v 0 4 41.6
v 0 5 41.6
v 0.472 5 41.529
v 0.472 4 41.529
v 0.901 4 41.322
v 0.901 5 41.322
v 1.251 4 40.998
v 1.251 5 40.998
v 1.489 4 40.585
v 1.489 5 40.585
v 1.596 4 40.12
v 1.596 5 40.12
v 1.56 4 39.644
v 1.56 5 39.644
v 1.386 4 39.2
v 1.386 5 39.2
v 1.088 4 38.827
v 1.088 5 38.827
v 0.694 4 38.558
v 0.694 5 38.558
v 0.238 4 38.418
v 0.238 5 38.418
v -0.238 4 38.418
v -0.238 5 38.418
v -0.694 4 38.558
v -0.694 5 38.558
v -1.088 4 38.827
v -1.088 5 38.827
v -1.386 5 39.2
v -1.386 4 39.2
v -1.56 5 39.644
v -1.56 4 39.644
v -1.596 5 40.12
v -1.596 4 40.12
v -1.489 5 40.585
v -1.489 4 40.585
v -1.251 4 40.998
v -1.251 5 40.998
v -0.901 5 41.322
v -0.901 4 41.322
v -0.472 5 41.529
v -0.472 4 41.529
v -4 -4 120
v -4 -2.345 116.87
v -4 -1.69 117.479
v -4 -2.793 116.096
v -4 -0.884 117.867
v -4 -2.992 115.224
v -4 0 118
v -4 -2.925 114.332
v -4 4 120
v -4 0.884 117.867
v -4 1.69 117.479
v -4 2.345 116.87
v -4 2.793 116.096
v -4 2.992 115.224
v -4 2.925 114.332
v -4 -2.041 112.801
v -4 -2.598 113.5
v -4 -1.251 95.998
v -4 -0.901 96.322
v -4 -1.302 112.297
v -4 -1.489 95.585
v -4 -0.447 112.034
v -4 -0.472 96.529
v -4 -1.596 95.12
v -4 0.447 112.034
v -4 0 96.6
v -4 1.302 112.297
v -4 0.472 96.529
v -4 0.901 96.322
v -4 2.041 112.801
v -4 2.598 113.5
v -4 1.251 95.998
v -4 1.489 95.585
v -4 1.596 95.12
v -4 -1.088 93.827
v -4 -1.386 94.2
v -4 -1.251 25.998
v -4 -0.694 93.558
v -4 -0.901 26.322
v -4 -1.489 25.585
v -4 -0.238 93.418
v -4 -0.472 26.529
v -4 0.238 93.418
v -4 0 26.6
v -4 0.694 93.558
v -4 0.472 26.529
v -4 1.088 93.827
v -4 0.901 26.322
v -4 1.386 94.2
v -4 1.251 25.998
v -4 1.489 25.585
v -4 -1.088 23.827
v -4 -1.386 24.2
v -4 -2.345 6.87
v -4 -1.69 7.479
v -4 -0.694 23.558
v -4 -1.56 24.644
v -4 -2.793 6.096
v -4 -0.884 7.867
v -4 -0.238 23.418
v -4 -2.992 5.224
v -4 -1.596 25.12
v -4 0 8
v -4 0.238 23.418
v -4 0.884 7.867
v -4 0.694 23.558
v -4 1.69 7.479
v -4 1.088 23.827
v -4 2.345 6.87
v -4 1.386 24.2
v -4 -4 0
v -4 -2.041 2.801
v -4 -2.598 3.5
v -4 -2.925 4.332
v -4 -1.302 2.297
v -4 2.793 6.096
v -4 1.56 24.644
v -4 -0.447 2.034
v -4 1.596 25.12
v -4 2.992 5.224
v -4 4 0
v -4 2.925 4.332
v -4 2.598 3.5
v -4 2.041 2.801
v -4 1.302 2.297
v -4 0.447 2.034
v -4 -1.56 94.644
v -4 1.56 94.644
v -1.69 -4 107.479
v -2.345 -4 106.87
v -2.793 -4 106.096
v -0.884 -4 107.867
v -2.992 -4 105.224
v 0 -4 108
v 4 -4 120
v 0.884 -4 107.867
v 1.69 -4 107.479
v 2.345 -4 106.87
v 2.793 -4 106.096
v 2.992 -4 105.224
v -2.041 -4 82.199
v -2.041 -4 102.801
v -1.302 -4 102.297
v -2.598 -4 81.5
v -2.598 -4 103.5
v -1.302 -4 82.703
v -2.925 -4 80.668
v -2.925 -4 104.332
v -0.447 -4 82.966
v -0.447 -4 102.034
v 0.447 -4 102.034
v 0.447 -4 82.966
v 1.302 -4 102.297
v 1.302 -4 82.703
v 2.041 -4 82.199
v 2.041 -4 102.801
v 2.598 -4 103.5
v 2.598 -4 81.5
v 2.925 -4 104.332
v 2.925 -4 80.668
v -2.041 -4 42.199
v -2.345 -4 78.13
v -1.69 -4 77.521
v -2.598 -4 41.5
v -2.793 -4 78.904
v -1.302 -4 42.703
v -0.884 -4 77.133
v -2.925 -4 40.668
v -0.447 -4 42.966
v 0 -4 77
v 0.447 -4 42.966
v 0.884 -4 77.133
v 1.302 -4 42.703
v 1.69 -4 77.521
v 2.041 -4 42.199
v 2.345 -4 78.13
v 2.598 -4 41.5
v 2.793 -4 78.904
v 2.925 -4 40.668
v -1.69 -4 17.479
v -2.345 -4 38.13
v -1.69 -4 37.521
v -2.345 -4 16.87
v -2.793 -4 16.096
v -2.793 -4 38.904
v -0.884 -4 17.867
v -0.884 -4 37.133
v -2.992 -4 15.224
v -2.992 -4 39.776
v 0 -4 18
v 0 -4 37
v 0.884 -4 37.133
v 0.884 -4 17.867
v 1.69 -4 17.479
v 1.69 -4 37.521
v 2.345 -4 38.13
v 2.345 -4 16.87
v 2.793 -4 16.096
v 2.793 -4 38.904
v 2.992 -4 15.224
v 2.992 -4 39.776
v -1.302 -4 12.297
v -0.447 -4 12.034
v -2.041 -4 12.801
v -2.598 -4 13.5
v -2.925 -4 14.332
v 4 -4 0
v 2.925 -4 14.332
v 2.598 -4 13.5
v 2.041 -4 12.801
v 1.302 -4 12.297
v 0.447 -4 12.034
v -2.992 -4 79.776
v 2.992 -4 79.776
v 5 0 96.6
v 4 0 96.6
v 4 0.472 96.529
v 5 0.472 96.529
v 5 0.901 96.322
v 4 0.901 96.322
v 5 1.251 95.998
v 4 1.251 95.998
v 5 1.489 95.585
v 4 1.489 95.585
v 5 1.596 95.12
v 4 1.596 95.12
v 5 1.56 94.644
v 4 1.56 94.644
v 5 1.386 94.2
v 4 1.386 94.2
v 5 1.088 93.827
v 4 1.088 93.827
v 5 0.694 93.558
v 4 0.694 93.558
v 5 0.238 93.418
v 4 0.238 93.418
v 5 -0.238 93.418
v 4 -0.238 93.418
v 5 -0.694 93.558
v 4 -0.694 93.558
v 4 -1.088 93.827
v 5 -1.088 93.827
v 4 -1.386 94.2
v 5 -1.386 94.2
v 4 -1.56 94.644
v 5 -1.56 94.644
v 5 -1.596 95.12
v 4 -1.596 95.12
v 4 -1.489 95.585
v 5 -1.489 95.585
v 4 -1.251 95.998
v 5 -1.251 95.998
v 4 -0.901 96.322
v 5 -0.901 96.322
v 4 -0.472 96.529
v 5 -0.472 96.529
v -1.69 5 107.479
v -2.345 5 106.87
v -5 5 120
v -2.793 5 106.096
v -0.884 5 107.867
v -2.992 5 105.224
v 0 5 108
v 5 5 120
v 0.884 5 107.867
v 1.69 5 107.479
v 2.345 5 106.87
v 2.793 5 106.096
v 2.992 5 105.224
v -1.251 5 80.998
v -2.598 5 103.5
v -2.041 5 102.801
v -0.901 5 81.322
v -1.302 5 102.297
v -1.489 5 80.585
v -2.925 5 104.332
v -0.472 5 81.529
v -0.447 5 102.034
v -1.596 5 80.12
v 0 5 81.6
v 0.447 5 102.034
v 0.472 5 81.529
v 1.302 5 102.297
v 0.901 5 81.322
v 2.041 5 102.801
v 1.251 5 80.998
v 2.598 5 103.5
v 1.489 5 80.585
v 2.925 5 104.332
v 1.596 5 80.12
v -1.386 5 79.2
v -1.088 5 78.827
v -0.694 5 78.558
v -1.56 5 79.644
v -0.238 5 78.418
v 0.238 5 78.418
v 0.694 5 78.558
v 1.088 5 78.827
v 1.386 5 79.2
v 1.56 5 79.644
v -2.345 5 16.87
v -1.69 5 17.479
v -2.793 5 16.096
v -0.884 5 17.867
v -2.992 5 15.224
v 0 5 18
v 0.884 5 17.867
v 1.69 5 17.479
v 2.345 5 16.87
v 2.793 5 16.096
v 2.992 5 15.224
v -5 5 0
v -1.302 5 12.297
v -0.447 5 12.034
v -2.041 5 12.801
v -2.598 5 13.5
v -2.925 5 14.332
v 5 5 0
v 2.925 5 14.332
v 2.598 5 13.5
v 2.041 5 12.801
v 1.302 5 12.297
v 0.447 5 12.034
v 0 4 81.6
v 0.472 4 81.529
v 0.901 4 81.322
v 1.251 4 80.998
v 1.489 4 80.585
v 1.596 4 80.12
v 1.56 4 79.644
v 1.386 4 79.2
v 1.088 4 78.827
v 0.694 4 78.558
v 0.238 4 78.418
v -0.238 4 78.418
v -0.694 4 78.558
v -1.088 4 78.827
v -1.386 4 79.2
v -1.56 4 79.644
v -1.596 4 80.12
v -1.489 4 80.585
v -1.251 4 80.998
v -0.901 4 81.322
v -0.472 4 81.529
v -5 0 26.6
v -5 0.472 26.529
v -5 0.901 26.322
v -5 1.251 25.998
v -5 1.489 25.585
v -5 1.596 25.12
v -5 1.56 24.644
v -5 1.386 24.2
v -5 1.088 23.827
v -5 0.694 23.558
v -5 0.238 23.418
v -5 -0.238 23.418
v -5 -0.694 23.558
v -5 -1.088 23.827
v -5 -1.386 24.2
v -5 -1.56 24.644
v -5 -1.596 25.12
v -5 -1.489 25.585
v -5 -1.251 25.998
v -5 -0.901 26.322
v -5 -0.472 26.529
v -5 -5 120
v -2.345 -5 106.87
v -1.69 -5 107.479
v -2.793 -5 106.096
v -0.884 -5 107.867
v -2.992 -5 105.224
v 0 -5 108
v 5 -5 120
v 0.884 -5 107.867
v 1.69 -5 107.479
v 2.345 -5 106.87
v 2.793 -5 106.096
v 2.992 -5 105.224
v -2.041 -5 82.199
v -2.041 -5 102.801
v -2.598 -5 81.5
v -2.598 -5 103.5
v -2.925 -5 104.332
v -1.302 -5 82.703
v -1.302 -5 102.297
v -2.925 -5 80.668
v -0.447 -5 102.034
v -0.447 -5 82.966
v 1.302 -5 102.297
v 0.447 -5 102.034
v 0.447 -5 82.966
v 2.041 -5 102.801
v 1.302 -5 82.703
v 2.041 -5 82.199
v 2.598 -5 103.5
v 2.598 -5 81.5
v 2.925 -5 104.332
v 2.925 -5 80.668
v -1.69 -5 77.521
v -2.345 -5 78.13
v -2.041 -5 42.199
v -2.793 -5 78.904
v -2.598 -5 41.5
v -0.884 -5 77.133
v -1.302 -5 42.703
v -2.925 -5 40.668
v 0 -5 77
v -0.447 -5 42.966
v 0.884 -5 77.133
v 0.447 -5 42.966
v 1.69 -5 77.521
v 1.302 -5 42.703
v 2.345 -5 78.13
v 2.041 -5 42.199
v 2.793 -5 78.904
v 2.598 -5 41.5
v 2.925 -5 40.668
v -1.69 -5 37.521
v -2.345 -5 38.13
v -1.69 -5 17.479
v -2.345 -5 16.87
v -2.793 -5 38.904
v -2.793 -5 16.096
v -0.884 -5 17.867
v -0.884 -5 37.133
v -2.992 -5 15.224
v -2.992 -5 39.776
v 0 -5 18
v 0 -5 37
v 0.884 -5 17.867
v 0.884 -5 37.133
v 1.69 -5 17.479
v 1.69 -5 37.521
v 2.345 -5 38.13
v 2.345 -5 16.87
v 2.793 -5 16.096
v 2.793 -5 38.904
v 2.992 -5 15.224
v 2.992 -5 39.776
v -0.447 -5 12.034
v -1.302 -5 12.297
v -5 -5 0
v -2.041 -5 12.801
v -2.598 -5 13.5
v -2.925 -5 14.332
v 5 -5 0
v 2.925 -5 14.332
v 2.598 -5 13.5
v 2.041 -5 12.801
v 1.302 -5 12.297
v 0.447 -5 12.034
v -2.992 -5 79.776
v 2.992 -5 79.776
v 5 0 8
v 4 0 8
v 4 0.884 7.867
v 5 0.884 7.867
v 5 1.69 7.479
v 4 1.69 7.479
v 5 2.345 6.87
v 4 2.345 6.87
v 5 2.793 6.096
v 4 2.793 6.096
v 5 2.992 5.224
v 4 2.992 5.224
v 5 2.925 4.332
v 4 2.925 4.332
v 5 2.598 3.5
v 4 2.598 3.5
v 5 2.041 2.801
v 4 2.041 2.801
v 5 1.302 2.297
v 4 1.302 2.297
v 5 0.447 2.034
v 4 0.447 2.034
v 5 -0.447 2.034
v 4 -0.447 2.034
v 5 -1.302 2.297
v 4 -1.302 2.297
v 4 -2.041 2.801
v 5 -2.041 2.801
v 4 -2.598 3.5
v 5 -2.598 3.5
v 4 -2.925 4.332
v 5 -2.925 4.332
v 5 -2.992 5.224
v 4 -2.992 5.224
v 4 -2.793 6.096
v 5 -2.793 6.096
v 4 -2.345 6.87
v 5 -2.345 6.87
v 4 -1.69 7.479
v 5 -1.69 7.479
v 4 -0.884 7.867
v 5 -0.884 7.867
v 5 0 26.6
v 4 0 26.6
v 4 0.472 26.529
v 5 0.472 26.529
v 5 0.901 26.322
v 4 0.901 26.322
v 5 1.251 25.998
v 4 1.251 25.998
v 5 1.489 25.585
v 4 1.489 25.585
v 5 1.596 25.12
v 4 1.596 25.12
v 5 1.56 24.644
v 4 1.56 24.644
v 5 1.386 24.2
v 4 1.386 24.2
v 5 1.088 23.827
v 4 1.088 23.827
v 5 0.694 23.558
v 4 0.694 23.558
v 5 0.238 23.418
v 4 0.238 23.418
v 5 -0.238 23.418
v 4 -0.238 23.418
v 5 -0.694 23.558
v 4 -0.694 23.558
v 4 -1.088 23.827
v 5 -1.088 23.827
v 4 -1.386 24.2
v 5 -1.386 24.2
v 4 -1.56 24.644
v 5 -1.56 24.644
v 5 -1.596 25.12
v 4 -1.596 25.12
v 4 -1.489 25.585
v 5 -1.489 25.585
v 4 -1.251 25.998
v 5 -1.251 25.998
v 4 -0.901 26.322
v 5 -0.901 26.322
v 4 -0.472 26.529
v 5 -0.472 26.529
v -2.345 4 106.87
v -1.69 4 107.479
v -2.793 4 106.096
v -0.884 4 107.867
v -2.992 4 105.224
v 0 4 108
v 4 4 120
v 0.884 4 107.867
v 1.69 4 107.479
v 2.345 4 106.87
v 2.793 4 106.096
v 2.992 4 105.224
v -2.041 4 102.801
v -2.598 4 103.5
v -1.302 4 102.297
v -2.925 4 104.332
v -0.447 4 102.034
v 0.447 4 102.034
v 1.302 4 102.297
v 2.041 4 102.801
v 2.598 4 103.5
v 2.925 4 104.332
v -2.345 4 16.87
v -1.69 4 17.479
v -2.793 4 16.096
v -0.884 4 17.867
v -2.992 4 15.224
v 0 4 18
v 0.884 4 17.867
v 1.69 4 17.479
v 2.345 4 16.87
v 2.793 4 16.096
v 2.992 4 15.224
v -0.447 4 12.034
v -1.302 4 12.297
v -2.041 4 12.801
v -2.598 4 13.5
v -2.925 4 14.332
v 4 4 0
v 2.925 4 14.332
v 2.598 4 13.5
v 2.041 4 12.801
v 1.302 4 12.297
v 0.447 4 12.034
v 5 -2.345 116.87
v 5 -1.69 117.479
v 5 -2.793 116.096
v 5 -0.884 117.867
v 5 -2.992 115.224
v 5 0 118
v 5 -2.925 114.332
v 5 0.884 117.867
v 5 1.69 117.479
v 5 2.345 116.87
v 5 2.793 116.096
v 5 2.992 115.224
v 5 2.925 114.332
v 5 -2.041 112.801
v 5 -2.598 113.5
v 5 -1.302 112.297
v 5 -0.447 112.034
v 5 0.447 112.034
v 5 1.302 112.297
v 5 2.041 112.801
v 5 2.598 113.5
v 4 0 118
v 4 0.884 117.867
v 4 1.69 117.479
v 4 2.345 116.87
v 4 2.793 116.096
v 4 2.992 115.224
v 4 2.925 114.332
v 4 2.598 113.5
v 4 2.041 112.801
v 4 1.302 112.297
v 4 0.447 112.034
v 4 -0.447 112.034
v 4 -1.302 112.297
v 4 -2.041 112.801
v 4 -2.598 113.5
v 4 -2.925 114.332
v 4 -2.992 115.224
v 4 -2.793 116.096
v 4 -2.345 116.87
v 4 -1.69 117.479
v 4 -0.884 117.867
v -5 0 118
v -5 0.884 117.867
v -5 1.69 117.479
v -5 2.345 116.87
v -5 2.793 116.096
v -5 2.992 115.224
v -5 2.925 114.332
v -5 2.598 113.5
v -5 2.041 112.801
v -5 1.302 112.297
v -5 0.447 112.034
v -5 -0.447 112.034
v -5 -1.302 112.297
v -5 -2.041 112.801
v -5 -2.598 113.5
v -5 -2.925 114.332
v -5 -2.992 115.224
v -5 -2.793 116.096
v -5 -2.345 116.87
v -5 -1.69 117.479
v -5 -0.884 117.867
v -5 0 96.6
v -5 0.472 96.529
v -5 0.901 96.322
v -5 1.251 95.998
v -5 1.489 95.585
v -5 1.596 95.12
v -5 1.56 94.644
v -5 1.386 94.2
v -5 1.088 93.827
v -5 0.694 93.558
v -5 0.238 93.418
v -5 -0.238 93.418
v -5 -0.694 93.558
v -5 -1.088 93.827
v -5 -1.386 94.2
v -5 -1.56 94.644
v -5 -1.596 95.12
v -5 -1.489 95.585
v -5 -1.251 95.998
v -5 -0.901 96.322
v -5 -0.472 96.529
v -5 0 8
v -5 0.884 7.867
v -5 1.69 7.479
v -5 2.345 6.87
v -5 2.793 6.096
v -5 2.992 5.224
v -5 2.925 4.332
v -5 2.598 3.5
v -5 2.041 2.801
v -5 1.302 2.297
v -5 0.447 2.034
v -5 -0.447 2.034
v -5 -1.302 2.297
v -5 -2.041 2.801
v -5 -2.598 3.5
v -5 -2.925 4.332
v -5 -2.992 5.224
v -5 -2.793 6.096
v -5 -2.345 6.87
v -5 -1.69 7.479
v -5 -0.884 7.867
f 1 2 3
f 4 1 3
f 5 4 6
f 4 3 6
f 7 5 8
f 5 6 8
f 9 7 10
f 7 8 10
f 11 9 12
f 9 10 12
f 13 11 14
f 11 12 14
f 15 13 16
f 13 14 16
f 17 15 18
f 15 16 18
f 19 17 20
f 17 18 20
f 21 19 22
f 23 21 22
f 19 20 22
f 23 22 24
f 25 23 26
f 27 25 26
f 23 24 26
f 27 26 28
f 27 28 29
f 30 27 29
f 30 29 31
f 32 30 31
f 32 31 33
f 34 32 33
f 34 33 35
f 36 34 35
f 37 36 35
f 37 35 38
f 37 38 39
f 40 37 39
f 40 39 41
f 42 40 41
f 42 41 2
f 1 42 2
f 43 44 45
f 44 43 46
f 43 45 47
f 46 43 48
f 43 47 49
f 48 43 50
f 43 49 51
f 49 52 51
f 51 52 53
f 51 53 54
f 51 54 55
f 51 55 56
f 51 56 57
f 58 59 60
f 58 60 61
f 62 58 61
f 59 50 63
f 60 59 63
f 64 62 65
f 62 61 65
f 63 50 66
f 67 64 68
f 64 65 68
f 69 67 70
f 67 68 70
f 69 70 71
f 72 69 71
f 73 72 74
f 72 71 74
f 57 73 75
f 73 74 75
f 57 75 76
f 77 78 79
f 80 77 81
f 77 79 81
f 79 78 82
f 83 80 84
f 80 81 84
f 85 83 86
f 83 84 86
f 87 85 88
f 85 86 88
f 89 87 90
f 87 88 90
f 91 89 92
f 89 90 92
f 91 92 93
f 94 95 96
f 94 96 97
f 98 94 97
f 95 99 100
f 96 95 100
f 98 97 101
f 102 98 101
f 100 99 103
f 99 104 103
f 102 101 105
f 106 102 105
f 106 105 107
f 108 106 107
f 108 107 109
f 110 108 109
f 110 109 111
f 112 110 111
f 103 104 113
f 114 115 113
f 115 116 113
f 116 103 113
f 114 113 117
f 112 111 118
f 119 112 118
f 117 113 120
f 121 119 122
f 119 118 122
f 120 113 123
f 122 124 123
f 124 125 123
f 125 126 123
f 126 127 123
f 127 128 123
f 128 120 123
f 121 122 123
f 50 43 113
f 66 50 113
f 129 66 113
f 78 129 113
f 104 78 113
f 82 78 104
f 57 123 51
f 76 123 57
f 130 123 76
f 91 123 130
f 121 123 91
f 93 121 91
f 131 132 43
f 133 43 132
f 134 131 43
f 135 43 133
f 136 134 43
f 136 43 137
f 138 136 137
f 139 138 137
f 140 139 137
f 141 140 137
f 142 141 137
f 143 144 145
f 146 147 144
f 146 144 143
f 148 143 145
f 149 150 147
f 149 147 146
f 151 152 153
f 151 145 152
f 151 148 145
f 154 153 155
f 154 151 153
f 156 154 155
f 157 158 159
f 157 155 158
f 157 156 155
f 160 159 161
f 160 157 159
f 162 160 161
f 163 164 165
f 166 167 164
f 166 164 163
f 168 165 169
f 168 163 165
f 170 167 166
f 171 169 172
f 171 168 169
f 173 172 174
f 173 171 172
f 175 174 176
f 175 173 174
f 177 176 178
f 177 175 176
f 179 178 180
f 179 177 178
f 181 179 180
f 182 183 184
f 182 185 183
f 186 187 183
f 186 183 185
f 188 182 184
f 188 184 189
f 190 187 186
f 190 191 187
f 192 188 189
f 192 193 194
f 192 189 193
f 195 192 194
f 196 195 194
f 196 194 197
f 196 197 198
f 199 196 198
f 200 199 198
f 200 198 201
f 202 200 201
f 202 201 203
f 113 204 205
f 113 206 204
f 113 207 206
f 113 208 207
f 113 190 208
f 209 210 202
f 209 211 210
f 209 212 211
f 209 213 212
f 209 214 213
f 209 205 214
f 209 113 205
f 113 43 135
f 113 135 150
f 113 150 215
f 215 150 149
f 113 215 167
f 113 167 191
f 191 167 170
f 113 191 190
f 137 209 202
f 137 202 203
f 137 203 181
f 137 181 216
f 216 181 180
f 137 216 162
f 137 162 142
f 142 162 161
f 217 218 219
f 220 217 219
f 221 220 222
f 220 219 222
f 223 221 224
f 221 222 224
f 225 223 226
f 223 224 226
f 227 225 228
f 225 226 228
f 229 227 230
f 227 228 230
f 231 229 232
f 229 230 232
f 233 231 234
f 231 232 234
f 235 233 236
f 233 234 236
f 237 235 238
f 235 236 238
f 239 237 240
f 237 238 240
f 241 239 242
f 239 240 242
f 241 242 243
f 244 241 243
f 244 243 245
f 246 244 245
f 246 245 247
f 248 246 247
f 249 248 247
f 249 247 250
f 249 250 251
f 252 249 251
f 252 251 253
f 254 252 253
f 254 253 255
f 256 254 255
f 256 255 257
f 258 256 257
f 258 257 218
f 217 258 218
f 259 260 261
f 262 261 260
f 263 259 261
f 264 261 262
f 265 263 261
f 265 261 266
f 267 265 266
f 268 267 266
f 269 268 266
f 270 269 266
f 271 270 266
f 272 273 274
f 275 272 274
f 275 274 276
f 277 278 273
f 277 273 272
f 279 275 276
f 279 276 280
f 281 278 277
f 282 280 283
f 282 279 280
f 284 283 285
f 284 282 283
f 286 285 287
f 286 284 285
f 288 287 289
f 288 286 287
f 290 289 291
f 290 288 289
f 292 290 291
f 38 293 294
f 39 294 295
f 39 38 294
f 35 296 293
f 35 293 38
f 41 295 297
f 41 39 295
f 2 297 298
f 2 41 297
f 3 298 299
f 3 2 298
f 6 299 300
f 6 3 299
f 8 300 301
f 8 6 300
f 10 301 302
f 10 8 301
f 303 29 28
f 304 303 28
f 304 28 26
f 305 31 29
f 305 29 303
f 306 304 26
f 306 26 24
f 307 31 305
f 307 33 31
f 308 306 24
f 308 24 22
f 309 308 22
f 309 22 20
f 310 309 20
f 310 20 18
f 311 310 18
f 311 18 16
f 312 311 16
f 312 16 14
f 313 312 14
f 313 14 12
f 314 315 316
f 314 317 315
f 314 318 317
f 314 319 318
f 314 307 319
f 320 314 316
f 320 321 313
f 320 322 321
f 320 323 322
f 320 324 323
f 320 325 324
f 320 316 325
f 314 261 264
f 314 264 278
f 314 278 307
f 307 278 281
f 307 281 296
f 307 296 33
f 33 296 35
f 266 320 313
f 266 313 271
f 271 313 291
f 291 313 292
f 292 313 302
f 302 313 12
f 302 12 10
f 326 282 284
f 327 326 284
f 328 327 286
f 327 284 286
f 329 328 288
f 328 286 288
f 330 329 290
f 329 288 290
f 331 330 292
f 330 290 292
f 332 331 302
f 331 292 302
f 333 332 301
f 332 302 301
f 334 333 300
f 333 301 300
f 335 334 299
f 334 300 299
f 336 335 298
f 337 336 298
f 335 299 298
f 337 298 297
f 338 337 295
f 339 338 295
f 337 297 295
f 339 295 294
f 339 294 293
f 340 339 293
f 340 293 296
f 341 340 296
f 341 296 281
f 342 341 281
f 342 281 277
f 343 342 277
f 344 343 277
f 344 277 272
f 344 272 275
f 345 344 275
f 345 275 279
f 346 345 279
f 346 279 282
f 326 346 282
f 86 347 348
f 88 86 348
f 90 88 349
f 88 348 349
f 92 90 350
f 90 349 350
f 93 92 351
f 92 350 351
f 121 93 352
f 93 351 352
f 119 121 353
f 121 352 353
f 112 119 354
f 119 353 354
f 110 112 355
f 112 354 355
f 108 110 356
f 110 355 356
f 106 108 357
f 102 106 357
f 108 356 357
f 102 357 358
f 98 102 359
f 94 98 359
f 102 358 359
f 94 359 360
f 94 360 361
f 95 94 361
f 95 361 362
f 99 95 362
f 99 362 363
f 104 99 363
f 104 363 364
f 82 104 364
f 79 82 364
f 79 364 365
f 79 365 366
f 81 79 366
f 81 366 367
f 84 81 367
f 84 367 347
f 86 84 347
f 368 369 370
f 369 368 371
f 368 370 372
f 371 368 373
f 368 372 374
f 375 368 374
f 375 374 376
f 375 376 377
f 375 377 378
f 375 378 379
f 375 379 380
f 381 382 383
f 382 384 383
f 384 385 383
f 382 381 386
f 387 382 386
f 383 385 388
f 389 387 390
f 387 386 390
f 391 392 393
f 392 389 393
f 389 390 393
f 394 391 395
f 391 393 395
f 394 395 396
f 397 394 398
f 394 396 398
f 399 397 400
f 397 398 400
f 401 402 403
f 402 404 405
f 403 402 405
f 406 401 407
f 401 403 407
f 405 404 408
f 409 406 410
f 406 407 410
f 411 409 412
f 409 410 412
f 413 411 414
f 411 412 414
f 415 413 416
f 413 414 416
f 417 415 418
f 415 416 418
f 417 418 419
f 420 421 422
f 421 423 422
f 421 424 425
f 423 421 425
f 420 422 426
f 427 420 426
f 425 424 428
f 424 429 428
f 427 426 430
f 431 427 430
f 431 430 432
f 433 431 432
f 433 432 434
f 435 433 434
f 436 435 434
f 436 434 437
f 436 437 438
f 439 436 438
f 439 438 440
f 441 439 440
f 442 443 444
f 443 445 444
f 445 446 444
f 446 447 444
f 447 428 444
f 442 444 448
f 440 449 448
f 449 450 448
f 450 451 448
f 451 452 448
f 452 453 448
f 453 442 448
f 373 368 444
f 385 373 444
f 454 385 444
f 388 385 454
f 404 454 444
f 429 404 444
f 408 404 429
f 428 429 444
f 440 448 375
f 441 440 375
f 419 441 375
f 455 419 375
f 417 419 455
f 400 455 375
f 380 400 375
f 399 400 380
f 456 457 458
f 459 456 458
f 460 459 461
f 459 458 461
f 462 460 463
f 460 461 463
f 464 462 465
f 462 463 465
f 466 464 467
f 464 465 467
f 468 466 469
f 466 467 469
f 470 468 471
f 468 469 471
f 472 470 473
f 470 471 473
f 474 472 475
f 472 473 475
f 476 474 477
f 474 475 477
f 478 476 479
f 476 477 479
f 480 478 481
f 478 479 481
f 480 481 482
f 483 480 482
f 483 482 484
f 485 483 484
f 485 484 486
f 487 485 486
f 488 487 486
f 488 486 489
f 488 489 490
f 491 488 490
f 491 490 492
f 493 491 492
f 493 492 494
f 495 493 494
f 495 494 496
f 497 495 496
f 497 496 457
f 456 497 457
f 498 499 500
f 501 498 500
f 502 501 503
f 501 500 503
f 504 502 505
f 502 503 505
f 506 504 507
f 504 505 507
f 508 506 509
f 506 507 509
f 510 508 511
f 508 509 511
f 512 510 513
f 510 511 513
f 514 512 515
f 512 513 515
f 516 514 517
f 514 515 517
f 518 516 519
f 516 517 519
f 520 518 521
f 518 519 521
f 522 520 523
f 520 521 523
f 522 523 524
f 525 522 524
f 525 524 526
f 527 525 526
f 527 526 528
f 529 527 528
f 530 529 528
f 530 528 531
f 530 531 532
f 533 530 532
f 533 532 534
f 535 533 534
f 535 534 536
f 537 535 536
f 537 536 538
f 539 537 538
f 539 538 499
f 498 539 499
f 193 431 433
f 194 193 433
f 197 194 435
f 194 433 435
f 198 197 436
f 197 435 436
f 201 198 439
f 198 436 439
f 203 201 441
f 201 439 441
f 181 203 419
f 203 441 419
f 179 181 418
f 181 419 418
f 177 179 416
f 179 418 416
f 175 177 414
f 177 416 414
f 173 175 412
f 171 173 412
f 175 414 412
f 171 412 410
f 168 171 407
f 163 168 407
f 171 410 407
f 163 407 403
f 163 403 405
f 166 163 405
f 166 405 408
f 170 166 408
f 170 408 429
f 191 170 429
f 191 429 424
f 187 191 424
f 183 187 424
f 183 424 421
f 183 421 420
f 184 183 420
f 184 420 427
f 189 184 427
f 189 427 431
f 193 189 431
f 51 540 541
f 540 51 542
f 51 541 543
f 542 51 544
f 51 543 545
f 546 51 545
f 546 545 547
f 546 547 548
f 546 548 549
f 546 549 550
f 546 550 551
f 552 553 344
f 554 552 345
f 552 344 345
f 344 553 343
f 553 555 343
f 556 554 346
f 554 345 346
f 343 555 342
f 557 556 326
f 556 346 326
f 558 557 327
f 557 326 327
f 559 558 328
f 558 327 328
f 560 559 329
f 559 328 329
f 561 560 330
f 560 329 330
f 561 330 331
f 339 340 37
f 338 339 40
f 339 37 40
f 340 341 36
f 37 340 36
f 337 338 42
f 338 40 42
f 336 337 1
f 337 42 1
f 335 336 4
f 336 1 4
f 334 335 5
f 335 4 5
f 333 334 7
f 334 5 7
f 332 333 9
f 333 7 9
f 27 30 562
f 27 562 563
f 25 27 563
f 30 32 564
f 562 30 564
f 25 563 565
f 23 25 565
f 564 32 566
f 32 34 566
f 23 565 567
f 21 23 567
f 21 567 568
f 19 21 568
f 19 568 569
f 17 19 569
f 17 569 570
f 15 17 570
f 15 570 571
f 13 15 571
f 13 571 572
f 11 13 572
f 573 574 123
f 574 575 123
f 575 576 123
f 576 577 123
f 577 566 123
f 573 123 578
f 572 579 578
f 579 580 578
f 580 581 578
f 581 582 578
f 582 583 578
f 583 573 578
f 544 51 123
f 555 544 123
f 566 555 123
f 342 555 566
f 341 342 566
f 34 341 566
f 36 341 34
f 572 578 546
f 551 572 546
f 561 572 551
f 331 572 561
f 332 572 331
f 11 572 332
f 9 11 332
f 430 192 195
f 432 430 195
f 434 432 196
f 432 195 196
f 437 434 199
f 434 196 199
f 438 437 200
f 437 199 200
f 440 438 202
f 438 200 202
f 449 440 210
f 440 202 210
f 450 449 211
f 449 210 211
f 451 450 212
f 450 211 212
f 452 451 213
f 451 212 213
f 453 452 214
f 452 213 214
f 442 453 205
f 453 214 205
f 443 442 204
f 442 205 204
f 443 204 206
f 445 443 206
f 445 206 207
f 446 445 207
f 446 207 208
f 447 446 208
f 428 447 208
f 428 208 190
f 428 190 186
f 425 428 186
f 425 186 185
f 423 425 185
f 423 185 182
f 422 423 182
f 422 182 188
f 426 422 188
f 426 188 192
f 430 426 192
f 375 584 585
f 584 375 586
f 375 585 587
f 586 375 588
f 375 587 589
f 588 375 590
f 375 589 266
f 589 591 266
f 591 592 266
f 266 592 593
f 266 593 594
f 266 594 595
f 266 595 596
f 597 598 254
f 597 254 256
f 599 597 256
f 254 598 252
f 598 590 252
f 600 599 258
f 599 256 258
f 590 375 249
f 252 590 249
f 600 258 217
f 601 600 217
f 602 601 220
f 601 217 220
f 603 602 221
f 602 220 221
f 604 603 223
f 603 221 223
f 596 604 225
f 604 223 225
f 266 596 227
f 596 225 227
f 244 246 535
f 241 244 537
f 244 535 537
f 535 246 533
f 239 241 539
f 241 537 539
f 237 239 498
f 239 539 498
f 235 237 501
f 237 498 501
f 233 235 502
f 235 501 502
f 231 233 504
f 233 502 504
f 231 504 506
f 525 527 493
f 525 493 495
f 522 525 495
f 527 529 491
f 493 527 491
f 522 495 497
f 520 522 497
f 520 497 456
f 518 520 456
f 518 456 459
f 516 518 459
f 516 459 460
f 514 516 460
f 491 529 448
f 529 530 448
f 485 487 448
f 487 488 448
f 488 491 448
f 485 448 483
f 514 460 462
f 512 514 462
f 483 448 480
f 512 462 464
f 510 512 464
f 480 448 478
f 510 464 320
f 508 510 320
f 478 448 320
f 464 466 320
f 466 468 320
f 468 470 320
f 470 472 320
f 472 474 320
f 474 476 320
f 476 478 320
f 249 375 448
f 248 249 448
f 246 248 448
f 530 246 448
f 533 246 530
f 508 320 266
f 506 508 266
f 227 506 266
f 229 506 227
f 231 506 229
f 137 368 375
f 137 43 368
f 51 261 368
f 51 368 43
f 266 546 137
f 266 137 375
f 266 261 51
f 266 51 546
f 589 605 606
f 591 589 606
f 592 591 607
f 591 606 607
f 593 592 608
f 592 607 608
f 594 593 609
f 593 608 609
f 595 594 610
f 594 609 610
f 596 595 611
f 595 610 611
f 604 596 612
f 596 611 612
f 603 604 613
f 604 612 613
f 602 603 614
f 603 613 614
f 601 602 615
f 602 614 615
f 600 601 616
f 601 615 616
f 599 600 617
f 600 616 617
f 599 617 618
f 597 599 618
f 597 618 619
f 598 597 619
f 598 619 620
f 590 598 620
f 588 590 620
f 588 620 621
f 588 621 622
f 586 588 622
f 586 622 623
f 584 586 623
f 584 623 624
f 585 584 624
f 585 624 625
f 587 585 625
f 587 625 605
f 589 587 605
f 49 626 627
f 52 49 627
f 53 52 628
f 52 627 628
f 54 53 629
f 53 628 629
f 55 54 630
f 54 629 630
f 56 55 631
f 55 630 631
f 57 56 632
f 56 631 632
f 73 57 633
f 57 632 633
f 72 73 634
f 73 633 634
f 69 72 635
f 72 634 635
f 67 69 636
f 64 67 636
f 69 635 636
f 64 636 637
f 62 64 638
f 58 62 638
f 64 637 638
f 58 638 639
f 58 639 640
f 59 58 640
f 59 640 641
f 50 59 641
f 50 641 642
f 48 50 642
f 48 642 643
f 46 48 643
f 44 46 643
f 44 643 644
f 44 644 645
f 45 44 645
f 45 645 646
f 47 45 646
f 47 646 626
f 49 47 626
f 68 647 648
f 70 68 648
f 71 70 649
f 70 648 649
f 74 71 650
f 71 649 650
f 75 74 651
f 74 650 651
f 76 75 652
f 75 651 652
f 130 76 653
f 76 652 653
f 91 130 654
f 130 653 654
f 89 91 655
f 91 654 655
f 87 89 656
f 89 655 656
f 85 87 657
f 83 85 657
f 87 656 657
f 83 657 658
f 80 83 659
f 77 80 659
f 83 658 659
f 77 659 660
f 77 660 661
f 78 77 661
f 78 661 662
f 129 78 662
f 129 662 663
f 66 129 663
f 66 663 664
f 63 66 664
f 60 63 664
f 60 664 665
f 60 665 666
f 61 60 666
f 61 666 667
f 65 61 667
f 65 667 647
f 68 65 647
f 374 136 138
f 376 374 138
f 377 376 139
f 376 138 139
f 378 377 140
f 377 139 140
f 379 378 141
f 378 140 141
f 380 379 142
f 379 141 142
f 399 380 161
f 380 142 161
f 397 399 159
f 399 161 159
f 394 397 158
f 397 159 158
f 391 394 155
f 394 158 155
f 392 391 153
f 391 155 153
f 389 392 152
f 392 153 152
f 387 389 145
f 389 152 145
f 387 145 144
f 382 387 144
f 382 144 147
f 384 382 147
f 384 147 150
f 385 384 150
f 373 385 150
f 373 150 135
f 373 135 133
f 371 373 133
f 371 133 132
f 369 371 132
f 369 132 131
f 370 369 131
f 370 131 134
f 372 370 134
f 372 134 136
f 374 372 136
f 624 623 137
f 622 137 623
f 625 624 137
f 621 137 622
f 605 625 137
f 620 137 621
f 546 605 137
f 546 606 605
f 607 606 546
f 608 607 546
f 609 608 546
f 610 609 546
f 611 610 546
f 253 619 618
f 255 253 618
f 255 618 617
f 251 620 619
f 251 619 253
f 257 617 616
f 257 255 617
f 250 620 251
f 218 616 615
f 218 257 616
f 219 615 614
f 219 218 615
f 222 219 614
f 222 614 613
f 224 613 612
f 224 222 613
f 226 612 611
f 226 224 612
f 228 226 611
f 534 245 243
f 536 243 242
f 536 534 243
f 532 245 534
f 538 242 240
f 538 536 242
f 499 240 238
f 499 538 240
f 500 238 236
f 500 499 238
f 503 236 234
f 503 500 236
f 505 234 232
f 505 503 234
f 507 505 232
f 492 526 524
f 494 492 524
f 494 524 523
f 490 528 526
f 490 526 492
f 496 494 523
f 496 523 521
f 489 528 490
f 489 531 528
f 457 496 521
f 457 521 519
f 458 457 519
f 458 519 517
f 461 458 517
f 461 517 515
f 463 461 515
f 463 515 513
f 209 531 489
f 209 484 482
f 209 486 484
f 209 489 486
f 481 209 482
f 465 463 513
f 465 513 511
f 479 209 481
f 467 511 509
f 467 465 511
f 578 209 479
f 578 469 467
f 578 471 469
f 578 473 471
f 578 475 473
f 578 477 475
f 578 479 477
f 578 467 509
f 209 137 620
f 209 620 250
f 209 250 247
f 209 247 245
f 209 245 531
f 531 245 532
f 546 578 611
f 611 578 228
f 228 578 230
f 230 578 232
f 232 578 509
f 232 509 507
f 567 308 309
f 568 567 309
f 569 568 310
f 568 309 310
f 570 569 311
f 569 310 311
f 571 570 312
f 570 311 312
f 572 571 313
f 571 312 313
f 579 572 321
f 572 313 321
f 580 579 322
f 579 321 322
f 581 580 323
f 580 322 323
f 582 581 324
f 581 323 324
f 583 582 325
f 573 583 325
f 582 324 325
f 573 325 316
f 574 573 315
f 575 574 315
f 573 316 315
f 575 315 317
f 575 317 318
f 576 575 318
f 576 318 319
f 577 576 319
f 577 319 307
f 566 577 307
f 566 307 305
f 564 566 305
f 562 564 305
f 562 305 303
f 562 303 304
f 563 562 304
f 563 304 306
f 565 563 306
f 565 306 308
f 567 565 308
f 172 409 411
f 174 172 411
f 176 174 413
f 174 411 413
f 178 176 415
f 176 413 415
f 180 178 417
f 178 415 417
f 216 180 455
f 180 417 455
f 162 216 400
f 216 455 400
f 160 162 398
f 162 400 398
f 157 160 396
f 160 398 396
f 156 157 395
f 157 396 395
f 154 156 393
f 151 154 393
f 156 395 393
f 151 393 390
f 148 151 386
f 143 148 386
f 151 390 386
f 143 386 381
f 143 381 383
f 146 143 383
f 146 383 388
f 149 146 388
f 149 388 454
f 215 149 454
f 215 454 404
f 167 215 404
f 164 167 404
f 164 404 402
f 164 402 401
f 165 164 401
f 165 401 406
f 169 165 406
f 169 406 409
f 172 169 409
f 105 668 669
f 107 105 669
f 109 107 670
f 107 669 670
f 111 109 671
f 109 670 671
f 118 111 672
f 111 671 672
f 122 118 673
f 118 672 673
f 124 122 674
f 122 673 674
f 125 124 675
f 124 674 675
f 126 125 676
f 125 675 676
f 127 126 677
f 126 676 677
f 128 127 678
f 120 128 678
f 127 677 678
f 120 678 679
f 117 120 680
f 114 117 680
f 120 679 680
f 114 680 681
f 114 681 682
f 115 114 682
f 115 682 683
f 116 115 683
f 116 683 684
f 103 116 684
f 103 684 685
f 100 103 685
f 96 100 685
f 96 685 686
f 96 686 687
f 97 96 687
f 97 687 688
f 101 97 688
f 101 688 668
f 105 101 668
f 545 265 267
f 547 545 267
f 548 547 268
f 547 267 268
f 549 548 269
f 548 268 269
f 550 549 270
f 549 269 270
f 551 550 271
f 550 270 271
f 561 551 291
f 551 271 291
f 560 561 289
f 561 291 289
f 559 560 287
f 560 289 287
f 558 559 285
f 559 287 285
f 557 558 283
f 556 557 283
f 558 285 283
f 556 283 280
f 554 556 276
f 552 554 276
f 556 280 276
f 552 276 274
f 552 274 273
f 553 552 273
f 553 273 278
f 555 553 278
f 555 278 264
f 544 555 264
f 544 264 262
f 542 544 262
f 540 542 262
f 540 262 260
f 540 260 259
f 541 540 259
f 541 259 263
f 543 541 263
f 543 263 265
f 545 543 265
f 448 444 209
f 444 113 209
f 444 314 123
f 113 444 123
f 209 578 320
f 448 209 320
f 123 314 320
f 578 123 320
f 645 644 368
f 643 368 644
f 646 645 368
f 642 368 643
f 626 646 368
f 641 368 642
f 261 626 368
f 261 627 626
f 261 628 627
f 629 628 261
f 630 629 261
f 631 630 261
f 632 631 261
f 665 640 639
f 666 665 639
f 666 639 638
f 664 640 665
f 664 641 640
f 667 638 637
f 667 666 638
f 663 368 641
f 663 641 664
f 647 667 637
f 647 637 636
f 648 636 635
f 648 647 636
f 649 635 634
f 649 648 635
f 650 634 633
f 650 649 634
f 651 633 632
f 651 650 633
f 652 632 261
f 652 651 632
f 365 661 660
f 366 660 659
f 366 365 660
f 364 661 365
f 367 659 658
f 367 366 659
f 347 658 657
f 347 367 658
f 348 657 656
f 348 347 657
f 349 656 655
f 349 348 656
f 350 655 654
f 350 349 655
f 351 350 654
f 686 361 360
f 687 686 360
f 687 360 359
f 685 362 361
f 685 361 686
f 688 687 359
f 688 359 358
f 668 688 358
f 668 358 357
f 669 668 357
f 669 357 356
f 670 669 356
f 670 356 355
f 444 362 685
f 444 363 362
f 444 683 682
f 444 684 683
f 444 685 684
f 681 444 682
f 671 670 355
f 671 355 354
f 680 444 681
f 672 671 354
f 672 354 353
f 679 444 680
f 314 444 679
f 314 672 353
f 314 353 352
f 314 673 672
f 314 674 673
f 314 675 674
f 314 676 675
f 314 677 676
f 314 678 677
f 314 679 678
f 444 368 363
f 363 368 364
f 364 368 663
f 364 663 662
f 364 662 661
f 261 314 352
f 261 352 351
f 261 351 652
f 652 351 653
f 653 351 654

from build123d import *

# Parameters (mm, degrees)
SKETCH_1_W          = 10
SKETCH_1_H          = 10
SKETCH_1_W_2        = 8
SKETCH_1_H_2        = 8
EXTRUDE_1_DEPTH     = 120
SKETCH_2_R          = 3
CUT_EXTRUDE_1_DEPTH = 121.519707932
SKETCH_3_R          = 3
CUT_EXTRUDE_2_DEPTH = 10
SKETCH_4_R          = 1.6
CUT_EXTRUDE_3_DEPTH = 10
SKETCH_5_R          = 1.6
CUT_EXTRUDE_4_DEPTH = 121.519707932
SKETCH_6_R          = 3
CUT_EXTRUDE_5_DEPTH = 2


with BuildPart() as part:
    # ｽｹｯﾁ1 → ﾎﾞｽ - 押し出し1 (new body)
    with BuildSketch(Plane.XY):
        Rectangle(SKETCH_1_W, SKETCH_1_H)
        Rectangle(SKETCH_1_W_2, SKETCH_1_H_2, mode=Mode.SUBTRACT)
    extrude(amount=EXTRUDE_1_DEPTH)

    # ｽｹｯﾁ2 → ｶｯﾄ - 押し出し1 (cut, through all)
    with BuildSketch(Plane.ZY.offset(5)):
        with Locations((5, 0)):
            Circle(SKETCH_2_R)
        with Locations((115, 0)):
            Circle(SKETCH_2_R)
    extrude(amount=-CUT_EXTRUDE_1_DEPTH, mode=Mode.SUBTRACT)

    # ｽｹｯﾁ3 → ｶｯﾄ - 押し出し2 (cut)
    with BuildSketch(Plane(origin=(0, 5, 0), x_dir=(1, 0, 0), z_dir=(0, 1, 0))):
        with Locations(Location((0, -105, 0), (0, 0, 270))):
            Circle(SKETCH_3_R)
        with Locations(Location((0, -15, 0), (0, 0, 270))):
            Circle(SKETCH_3_R)
    extrude(amount=-CUT_EXTRUDE_2_DEPTH, mode=Mode.SUBTRACT)

    # ｽｹｯﾁ4 → ｶｯﾄ - 押し出し3 (cut)
    with BuildSketch(Plane(origin=(0, 5, 0), x_dir=(1, 0, 0), z_dir=(0, 1, 0))):
        with Locations(Location((0, -40, 0), (0, 0, 270))):
            Circle(SKETCH_4_R)
        with Locations(Location((0, -80, 0), (0, 0, 270))):
            Circle(SKETCH_4_R)
    extrude(amount=-CUT_EXTRUDE_3_DEPTH, mode=Mode.SUBTRACT)

    # ｽｹｯﾁ5 → ｶｯﾄ - 押し出し4 (cut, through all)
    with BuildSketch(Plane.ZY.offset(5)):
        with Locations((25, 0)):
            Circle(SKETCH_5_R)
        with Locations((95, 0)):
            Circle(SKETCH_5_R)
    extrude(amount=-CUT_EXTRUDE_4_DEPTH, mode=Mode.SUBTRACT)

    # ｽｹｯﾁ6 → ｶｯﾄ - 押し出し5 (cut)
    with BuildSketch(Plane(origin=(0, -5, 0), x_dir=(-1, 0, 0), z_dir=(0, -1, 0))):
        with Locations(Location((0, -40, 0), (0, 0, 90))):
            Circle(SKETCH_6_R)
        with Locations(Location((0, -80, 0), (0, 0, 90))):
            Circle(SKETCH_6_R)
    extrude(amount=-CUT_EXTRUDE_5_DEPTH, mode=Mode.SUBTRACT)


solid = part.part
